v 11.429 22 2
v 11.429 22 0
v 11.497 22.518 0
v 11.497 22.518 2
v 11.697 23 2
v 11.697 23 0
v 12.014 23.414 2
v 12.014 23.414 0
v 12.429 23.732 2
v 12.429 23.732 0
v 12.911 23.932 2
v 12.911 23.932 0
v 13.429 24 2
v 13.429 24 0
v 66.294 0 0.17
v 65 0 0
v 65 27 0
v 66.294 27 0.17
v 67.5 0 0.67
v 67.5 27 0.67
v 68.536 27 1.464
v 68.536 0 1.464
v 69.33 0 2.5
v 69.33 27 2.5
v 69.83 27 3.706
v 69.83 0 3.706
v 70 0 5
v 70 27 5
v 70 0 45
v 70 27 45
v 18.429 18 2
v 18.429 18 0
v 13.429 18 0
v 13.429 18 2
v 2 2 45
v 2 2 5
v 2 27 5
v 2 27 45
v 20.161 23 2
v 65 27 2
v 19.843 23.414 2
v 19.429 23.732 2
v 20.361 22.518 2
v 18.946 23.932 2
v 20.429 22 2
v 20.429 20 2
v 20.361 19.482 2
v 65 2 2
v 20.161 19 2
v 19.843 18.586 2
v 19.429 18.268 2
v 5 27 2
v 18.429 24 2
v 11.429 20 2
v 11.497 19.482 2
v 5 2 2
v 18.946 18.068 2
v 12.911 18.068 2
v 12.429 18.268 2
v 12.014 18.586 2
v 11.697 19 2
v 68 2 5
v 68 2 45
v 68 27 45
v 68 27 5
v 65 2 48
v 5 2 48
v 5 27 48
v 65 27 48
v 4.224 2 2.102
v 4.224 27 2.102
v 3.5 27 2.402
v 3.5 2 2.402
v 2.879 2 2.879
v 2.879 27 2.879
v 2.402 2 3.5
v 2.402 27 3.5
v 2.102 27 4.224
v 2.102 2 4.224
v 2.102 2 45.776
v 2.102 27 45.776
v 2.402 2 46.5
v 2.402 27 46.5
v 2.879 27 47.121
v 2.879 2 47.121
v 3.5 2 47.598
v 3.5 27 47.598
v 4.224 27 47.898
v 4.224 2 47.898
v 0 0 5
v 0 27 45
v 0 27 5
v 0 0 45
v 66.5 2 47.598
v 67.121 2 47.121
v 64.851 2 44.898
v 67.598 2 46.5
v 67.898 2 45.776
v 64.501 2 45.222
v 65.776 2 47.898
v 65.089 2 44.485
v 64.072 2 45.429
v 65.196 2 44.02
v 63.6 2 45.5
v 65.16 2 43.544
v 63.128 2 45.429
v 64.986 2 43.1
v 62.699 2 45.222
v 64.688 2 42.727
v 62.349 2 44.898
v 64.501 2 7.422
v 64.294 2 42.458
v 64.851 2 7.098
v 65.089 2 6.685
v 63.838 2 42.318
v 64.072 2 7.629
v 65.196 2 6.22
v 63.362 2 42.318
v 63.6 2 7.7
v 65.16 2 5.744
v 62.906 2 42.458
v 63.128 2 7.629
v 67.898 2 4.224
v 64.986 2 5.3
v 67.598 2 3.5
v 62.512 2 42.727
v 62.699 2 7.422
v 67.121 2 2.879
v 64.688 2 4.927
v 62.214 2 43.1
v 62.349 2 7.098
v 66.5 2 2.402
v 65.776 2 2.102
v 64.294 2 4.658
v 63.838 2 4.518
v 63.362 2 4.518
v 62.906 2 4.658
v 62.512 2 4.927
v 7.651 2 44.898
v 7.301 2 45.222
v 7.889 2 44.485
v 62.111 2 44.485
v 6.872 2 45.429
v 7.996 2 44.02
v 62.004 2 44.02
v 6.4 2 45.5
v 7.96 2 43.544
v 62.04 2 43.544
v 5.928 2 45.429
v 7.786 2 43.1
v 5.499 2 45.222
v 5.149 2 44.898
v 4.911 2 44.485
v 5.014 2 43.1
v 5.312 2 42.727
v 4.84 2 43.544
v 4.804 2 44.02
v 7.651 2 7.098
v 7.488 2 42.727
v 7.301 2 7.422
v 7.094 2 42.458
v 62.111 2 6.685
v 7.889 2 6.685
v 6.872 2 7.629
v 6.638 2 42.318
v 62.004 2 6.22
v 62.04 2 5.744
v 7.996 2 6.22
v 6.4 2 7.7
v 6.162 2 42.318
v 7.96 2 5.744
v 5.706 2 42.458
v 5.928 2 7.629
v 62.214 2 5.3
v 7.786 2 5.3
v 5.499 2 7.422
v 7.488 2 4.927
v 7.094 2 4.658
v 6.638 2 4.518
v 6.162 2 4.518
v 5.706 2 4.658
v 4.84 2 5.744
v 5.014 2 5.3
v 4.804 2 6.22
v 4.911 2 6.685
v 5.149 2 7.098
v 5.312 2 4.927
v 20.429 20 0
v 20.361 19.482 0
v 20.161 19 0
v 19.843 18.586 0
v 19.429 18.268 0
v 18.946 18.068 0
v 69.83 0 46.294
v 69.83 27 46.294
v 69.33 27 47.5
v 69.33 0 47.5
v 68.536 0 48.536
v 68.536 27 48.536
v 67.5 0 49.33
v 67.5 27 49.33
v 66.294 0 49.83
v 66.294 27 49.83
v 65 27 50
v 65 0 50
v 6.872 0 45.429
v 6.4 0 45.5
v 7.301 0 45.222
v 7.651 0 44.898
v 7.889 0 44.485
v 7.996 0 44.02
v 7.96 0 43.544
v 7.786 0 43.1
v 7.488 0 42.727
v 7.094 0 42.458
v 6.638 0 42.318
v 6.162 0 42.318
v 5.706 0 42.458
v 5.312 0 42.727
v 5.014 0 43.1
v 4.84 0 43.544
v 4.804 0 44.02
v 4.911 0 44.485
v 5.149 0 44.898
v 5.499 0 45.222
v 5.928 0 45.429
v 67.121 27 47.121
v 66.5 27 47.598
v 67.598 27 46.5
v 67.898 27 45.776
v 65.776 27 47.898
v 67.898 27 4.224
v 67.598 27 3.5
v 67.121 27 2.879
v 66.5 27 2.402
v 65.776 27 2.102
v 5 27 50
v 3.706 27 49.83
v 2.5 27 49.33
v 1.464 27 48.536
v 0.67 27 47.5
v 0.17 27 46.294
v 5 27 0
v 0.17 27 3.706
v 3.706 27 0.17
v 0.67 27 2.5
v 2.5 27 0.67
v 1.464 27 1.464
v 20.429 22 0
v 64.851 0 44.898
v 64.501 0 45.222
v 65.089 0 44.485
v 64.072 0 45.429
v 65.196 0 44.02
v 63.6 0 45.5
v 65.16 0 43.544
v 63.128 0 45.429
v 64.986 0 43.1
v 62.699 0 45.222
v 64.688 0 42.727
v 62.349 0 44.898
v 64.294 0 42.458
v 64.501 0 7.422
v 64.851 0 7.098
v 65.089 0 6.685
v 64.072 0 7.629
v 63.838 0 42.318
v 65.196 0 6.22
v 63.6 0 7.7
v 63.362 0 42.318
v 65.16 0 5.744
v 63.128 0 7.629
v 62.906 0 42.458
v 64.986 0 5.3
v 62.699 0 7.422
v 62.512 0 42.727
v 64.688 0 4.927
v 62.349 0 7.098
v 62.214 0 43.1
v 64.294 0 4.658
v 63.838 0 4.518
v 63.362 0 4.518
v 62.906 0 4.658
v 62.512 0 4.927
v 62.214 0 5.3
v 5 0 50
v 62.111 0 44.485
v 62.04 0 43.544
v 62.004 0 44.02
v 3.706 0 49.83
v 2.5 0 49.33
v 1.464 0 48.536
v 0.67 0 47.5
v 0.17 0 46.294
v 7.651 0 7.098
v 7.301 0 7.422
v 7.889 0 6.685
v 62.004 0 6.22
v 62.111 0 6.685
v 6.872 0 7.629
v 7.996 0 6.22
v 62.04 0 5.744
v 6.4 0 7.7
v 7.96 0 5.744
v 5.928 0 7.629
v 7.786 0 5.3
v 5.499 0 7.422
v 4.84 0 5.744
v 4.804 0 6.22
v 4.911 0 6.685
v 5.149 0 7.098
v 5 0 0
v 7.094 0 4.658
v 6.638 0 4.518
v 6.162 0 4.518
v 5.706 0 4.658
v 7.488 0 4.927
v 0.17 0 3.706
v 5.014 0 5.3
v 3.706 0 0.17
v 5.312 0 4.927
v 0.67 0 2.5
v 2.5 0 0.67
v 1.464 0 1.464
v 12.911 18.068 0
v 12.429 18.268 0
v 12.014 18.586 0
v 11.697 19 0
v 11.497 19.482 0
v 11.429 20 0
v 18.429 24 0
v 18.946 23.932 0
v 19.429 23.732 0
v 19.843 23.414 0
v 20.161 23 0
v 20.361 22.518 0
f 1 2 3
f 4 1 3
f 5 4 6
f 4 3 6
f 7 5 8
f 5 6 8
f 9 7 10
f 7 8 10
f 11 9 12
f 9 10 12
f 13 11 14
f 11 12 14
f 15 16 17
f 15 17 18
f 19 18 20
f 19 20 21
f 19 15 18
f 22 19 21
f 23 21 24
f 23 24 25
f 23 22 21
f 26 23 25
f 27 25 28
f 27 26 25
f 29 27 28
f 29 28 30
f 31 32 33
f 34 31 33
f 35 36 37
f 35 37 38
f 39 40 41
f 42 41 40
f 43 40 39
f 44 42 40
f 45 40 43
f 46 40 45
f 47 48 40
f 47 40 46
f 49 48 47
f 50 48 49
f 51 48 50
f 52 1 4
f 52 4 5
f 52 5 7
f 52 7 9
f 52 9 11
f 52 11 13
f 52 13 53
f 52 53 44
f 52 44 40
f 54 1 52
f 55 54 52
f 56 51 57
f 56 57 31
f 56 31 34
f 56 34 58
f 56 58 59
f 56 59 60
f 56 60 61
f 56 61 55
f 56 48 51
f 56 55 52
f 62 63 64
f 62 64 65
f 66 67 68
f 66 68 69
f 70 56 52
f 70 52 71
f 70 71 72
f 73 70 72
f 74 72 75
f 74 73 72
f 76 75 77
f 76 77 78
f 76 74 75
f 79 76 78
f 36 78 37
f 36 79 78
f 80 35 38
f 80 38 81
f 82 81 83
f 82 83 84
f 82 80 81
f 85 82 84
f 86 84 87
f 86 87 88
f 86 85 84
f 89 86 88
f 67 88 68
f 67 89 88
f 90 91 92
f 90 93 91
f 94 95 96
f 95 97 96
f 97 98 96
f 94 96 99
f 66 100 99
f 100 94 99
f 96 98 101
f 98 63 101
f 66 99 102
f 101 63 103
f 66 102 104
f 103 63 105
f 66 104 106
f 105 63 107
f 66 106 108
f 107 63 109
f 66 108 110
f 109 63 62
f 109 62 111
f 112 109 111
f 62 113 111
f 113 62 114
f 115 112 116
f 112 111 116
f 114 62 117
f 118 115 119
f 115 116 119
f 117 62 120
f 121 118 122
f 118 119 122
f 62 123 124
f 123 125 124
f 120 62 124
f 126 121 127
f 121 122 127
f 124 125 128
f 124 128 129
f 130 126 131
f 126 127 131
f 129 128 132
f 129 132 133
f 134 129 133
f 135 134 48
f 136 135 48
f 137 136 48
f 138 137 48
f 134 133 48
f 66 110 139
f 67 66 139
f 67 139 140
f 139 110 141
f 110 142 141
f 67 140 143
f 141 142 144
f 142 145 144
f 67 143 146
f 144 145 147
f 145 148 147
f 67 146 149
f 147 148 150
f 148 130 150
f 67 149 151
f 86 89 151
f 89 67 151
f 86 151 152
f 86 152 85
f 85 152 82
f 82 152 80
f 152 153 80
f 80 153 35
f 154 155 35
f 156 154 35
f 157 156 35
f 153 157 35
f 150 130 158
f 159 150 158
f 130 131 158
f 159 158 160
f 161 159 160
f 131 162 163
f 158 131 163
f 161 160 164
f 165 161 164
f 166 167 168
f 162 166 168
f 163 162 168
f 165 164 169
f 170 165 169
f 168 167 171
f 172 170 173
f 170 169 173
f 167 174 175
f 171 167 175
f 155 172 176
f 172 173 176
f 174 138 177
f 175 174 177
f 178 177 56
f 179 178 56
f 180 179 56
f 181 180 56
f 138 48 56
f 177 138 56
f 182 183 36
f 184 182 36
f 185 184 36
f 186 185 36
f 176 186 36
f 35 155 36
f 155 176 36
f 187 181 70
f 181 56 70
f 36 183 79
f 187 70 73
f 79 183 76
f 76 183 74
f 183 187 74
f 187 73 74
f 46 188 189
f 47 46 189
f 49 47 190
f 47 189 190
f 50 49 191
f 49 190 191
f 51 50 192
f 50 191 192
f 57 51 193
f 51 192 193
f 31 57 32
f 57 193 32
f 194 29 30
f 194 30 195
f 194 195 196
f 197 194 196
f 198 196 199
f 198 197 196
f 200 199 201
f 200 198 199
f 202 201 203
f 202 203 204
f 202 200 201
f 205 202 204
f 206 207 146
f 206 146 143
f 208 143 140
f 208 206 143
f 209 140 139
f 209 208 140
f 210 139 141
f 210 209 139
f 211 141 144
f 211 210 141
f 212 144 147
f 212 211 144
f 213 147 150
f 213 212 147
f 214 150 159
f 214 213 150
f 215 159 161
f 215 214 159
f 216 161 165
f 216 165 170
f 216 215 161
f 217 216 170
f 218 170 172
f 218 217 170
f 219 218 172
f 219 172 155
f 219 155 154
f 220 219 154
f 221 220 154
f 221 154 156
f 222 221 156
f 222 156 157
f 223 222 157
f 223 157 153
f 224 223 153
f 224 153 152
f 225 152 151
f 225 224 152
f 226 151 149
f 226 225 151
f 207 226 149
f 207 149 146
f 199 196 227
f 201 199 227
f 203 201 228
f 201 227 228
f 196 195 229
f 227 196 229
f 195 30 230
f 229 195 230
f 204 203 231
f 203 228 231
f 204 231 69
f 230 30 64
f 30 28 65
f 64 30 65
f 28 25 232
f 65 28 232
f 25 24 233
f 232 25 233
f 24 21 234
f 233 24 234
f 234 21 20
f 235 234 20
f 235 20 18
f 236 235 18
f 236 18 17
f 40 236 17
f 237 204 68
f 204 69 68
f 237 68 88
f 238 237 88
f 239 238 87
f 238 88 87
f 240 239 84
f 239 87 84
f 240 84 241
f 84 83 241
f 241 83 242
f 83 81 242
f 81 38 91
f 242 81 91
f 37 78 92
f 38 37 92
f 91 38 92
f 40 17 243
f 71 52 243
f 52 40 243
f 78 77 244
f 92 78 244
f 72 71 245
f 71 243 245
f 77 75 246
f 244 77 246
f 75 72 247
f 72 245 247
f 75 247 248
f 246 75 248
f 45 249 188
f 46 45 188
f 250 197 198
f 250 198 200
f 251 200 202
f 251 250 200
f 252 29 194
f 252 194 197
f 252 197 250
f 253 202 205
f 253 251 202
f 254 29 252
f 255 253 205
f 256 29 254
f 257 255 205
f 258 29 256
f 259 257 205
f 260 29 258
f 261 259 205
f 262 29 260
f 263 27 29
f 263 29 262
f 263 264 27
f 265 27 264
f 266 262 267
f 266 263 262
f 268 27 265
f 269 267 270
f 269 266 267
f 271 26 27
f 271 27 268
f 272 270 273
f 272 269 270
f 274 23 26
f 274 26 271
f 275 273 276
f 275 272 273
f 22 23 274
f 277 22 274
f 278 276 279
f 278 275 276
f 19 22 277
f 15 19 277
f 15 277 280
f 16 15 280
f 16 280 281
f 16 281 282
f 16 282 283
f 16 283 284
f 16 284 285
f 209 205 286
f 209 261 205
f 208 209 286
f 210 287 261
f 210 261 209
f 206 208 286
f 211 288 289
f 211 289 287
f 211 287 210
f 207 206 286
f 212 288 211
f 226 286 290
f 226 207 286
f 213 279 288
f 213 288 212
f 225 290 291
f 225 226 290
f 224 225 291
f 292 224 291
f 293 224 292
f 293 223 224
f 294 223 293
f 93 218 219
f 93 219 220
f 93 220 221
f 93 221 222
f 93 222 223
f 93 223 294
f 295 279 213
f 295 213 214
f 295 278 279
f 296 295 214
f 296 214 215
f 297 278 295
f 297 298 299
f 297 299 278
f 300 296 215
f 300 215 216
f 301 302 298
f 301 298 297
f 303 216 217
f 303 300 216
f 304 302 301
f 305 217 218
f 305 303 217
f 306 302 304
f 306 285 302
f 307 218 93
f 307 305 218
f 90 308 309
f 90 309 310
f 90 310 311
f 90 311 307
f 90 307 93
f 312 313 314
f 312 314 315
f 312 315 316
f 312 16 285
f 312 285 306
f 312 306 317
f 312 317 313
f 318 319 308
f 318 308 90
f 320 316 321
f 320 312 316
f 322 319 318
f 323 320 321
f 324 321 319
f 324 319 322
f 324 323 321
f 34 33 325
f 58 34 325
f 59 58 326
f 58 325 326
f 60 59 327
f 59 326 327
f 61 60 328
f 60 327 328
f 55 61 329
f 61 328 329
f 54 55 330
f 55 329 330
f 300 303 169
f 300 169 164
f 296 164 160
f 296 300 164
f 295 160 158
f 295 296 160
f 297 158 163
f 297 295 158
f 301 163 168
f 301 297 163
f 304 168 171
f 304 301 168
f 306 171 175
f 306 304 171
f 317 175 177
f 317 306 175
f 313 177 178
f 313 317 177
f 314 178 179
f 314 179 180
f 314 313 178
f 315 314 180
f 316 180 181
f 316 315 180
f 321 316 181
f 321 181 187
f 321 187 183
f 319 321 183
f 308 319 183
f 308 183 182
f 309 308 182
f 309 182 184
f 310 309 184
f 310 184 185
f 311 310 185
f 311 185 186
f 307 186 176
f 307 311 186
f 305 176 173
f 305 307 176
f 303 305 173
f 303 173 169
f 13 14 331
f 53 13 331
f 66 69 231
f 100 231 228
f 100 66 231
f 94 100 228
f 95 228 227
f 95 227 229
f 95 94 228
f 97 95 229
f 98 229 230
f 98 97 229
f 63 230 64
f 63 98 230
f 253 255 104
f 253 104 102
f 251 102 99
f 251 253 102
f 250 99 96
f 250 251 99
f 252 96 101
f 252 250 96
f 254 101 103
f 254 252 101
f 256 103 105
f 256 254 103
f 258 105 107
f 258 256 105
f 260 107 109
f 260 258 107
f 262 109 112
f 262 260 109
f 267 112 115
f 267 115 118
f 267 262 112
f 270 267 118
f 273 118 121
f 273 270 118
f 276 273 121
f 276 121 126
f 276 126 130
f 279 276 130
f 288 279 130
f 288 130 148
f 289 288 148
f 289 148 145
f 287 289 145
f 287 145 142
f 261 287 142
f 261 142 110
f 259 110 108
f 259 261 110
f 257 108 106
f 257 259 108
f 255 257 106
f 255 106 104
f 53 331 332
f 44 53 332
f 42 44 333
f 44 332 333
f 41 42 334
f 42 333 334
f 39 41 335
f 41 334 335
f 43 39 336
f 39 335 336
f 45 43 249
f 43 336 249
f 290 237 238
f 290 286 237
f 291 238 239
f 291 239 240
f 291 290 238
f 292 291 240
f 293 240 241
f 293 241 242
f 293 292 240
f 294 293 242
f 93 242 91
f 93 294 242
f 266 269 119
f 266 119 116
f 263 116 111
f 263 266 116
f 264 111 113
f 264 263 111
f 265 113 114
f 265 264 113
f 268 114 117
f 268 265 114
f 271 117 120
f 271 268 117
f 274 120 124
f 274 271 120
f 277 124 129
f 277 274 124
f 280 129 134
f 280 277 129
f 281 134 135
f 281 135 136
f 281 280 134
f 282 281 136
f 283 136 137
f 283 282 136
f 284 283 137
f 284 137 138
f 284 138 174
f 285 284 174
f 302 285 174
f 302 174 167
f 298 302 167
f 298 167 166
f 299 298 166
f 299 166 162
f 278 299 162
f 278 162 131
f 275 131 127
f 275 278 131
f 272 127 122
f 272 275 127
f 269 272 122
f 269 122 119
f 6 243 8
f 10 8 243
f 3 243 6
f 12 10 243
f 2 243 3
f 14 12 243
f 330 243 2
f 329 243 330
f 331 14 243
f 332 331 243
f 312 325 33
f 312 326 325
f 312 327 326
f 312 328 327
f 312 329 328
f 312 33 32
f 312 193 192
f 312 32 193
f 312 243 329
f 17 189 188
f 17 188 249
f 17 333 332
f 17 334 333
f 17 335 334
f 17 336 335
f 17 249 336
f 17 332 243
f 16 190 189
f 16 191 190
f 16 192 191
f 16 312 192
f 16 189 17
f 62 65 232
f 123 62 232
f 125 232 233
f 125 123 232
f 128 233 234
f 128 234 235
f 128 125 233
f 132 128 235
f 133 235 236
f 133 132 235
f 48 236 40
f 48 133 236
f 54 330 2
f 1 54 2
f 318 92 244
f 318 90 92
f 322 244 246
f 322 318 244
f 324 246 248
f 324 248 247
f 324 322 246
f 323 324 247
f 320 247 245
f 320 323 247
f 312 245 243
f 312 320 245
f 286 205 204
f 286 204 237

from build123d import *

# Parameters (mm, degrees)
SKETCH1_R           = 1.6
BOSS_EXTRUDE2_DEPTH = 2
BOSS_EXTRUDE3_DEPTH = 25
CUT_EXTRUDE1_REACH  = 92.161


with BuildPart() as part:
    # Sketch1 → Boss-Extrude2 (new body)
    with BuildSketch(Plane(origin=(0, 0, 0), x_dir=(1, 0, 0), z_dir=(0, 1, 0))):
        with BuildLine():
            Line((5, 0), (65, 0))
            ThreePointArc((65, 0), (68.535533906, -1.464466094), (70, -5))
            Line((70, -5), (70, -45))
            ThreePointArc((70, -45), (68.535533906, -48.535533906), (65, -50))
            Line((65, -50), (5, -50))
            ThreePointArc((5, -50), (1.464466094, -48.535533906), (0, -45))
            Line((0, -45), (0, -5))
            ThreePointArc((0, -5), (1.464466094, -1.464466094), (5, 0))
        make_face()
        with Locations(Location((6.4, -6.1, 0), (0, 0, 270))):
            Circle(SKETCH1_R, mode=Mode.SUBTRACT)
        with Locations(Location((63.6, -6.1, 0), (0, 0, 270))):
            Circle(SKETCH1_R, mode=Mode.SUBTRACT)
        with Locations(Location((6.4, -43.9, 0), (0, 0, 270))):
            Circle(SKETCH1_R, mode=Mode.SUBTRACT)
        with Locations(Location((63.6, -43.9, 0), (0, 0, 270))):
            Circle(SKETCH1_R, mode=Mode.SUBTRACT)
    extrude(amount=BOSS_EXTRUDE2_DEPTH)

    # Sketch2 → Boss-Extrude3 (add)
    with BuildSketch(Plane(origin=(0, 2, 0), x_dir=(1, 0, 0), z_dir=(0, 1, 0))):
        with BuildLine():
            Line((5, 0), (65, 0))
            ThreePointArc((65, 0), (68.535533906, -1.464466094), (70, -5))
            Line((70, -5), (70, -45))
            ThreePointArc((70, -45), (68.535533906, -48.535533906), (65, -50))
            Line((65, -50), (5, -50))
            ThreePointArc((5, -50), (1.464466094, -48.535533906), (0, -45))
            Line((0, -45), (0, -5))
            ThreePointArc((0, -5), (1.464466094, -1.464466094), (5, 0))
        make_face()
        with BuildLine():
            Line((2, -5), (2, -45))
            ThreePointArc((2, -45), (2.878679656, -47.121320344), (5, -48))
            Line((5, -48), (65, -48))
            ThreePointArc((65, -48), (67.121320344, -47.121320344), (68, -45))
            Line((68, -45), (68, -5))
            ThreePointArc((68, -5), (67.121320344, -2.878679656), (65, -2))
            Line((65, -2), (5, -2))
            ThreePointArc((5, -2), (2.878679656, -2.878679656), (2, -5))
        make_face(mode=Mode.SUBTRACT)
    extrude(amount=BOSS_EXTRUDE3_DEPTH)

    # Sketch3 → Cut-Extrude1 (cut, up to next)
    with BuildSketch(Plane(origin=(0, 0, 0), x_dir=(-1, 0, 0), z_dir=(0, 0, -1)), mode=Mode.PRIVATE) as cut_extrude1_sk1:
        with BuildLine():
            Line((-13.428689643, 24), (-18.428689643, 24))
            ThreePointArc((-18.428689643, 24), (-19.842903206, 23.414213562), (-20.428689643, 22))
            Line((-20.428689643, 22), (-20.428689643, 20))
            ThreePointArc((-20.428689643, 20), (-19.842903206, 18.585786438), (-18.428689643, 18))
            Line((-18.428689643, 18), (-13.428689643, 18))
            ThreePointArc((-13.428689643, 18), (-12.014476081, 18.585786438), (-11.428689643, 20))
            Line((-11.428689643, 20), (-11.428689643, 22))
            ThreePointArc((-11.428689643, 22), (-12.014476081, 23.414213562), (-13.428689643, 24))
        make_face()
    cut_extrude1_tool1 = extrude(cut_extrude1_sk1.sketch, amount=-CUT_EXTRUDE1_REACH, mode=Mode.PRIVATE) & part.part
    add(cut_extrude1_tool1.solids().sort_by_distance((15.92869, 21, 0))[0], mode=Mode.SUBTRACT)


solid = part.part
